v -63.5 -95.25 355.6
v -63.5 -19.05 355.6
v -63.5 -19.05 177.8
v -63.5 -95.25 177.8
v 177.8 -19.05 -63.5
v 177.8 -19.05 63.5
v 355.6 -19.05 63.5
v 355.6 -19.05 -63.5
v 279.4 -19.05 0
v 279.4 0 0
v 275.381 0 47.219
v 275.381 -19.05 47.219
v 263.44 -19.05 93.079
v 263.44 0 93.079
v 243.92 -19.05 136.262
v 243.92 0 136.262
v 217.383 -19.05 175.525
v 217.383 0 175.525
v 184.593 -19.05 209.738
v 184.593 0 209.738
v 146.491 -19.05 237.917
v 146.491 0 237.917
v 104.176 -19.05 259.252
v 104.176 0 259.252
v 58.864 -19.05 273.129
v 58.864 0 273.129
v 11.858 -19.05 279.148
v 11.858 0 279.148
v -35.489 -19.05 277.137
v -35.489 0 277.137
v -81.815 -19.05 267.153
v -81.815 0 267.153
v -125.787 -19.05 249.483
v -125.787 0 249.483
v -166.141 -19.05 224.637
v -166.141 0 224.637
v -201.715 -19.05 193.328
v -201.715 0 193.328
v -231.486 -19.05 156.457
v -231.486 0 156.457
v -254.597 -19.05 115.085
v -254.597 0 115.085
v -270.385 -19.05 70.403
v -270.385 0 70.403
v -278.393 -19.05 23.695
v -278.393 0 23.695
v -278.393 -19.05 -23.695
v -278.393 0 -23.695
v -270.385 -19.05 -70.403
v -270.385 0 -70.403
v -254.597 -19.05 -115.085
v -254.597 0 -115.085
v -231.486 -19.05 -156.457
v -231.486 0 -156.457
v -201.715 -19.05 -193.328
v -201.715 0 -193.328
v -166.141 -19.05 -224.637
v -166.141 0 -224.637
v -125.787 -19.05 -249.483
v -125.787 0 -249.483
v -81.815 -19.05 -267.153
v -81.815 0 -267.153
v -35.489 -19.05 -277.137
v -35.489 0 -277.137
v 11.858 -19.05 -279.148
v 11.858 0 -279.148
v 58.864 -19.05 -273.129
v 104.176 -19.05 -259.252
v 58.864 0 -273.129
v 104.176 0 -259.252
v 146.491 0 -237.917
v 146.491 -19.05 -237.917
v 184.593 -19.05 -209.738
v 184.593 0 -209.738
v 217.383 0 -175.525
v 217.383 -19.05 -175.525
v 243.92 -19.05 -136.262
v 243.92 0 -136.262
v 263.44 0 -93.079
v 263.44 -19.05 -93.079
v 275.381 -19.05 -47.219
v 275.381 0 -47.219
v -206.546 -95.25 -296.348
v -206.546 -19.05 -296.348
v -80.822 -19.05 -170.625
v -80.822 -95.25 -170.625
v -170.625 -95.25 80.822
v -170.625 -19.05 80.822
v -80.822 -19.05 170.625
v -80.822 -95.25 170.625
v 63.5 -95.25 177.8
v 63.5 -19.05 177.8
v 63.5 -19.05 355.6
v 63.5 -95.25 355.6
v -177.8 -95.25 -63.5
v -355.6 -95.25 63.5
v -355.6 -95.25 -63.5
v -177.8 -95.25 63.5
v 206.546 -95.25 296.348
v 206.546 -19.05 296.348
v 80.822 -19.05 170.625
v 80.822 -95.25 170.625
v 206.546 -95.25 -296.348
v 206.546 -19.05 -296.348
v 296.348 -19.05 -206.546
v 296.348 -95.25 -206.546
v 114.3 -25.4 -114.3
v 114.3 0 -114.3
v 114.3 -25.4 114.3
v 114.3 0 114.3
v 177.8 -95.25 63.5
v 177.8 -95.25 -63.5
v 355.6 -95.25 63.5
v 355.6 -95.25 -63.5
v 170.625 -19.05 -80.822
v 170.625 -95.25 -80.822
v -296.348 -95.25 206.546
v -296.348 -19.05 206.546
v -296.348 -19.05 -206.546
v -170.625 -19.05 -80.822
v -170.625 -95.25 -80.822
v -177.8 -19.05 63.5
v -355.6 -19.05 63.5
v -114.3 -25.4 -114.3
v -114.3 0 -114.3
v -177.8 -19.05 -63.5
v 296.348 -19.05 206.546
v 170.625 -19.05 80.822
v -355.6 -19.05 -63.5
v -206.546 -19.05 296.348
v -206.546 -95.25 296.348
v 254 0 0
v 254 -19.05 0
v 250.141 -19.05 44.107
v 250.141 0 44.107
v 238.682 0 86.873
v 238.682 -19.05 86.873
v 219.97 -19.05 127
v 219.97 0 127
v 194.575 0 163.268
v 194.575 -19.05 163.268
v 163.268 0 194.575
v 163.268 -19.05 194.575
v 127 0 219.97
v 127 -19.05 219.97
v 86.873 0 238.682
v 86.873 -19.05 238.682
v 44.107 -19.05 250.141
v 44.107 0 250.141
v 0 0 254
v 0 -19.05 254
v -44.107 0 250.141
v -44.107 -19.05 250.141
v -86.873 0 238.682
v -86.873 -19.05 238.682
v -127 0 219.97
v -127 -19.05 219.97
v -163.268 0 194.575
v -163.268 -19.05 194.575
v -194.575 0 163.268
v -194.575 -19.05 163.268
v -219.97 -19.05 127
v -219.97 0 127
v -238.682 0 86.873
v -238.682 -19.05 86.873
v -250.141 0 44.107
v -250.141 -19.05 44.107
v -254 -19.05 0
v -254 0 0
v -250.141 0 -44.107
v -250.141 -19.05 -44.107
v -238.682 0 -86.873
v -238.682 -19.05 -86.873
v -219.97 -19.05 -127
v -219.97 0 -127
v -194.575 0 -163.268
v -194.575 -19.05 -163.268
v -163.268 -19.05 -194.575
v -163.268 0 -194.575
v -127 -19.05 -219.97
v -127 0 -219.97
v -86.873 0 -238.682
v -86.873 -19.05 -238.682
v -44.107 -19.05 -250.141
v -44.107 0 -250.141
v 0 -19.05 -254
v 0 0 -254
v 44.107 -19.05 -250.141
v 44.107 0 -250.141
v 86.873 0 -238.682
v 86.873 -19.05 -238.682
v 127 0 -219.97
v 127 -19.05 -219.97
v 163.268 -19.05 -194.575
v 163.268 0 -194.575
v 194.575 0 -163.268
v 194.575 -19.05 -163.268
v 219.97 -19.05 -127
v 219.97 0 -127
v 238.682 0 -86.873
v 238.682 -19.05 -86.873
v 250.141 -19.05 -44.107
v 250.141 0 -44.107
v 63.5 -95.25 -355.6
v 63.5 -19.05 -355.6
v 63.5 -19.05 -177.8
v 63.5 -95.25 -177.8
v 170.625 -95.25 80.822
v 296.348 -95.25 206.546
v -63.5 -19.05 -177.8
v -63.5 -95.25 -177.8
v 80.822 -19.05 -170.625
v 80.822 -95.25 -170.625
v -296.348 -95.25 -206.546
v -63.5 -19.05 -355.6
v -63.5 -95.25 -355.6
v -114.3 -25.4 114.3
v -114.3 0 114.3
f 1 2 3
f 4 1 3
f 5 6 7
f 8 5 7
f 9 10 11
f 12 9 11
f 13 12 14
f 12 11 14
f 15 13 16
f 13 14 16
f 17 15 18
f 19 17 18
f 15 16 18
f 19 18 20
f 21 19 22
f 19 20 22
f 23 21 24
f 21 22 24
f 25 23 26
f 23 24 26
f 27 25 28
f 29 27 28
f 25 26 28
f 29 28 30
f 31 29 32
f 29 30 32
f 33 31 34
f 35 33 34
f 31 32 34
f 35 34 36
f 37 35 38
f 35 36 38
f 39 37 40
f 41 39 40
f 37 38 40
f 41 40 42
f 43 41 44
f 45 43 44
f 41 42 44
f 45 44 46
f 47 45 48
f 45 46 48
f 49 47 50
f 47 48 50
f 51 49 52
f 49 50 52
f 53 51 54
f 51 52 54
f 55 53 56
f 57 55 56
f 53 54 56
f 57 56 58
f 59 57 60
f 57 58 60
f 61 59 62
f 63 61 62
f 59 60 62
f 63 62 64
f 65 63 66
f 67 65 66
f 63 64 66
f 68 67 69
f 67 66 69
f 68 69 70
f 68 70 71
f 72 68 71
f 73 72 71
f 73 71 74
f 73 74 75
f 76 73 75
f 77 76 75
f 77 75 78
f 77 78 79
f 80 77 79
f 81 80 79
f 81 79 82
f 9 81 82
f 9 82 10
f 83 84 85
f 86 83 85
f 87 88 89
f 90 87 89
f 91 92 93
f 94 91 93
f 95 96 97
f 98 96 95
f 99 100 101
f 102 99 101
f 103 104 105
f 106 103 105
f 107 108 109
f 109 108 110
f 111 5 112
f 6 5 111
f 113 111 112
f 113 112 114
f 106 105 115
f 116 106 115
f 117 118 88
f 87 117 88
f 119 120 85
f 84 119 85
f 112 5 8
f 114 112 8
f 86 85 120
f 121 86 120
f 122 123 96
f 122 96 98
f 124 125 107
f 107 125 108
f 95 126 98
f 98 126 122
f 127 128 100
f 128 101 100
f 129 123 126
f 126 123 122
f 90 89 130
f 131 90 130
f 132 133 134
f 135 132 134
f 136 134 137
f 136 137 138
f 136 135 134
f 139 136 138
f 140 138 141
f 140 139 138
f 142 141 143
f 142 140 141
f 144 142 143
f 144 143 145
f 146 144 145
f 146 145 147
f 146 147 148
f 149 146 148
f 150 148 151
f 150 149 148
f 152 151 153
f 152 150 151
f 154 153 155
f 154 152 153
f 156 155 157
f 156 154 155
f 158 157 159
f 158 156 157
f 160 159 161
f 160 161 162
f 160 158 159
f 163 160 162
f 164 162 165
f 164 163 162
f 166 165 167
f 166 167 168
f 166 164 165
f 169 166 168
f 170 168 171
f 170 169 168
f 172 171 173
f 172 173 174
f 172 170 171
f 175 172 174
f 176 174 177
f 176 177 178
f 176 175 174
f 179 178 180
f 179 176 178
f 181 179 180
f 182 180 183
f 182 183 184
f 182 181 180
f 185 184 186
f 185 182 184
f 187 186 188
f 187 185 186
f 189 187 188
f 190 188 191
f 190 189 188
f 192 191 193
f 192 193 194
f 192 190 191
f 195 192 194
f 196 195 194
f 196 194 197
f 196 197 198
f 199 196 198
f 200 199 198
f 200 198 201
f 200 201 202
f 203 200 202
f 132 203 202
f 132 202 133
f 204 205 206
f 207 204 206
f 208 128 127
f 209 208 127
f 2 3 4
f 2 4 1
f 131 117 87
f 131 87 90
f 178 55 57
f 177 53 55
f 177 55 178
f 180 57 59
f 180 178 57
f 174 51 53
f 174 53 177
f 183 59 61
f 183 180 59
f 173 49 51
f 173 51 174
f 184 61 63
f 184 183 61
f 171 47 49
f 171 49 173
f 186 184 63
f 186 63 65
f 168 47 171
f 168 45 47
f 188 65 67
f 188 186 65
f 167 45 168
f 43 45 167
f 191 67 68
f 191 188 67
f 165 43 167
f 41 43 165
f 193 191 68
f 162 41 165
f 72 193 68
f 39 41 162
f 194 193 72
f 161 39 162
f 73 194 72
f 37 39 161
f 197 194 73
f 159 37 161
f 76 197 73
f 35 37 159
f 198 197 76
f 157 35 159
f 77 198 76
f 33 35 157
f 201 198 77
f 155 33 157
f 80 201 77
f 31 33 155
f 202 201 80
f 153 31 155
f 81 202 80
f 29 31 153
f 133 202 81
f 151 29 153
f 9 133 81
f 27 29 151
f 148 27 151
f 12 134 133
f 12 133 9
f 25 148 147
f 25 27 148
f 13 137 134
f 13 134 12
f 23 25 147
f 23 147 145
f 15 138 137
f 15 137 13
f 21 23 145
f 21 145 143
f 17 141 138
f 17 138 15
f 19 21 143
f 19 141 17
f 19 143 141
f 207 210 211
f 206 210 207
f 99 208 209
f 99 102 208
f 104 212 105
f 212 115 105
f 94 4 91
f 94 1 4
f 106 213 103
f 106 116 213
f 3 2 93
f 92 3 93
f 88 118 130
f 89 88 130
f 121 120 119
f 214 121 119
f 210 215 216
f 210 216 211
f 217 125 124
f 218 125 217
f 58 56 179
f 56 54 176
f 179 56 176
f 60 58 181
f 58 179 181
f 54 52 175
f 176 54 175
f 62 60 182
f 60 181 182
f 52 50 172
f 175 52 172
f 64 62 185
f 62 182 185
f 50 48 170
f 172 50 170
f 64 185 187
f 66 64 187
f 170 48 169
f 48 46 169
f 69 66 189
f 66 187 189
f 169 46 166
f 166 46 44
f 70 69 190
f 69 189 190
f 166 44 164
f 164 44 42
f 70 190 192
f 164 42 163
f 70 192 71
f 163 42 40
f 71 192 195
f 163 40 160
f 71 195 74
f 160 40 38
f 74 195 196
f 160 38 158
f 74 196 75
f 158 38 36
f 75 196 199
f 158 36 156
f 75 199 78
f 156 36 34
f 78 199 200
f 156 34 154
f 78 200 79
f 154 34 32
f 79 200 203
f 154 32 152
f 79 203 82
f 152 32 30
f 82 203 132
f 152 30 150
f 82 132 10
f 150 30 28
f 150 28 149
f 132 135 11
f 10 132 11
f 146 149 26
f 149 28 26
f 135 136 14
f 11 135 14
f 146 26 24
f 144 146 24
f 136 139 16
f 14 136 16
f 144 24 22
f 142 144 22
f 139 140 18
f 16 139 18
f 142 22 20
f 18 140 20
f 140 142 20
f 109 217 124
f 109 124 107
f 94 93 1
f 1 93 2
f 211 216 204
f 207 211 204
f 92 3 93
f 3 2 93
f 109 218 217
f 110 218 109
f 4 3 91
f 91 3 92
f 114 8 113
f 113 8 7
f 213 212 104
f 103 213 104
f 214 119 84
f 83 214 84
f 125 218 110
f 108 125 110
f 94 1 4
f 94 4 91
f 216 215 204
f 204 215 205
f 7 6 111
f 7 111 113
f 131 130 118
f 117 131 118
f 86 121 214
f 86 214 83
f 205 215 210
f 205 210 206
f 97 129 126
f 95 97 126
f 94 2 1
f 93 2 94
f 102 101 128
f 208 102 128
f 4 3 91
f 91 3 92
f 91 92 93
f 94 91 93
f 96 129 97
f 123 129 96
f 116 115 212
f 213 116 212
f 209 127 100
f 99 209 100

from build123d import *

# Parameters (mm, degrees)
F0_R     = 279.4
F0_R_2   = 254
F1_DEPTH = 19.05
F3_DEPTH = 76.2
F2_W     = 127
F2_H     = 177.8
F4_DEPTH = 76.2
F2_W_2   = 177.8
F2_H_2   = 127
F5_W     = 228.6
F5_H     = 228.6
F6_DEPTH = 25.4


with BuildPart() as f1:
    # F0 (on Front) → F1 (new body)
    with BuildSketch(Plane.XZ):
        Circle(F0_R)
        Circle(F0_R_2, mode=Mode.SUBTRACT)
    extrude(amount=F1_DEPTH)


with BuildPart() as f3:
    # F2 (on face) → F3 (new body)
    with BuildSketch(Plane.XZ.offset(19.05)):
        with BuildLine():
            ThreePointArc((63.5, 272.0884231275), (0, 279.4), (-63.5, 272.0884231275))
            Line((-63.5, 272.0884231275), (-63.5, 245.9344424842))
            ThreePointArc((-63.5, 245.9344424842), (0, 254), (63.5, 245.9344424842))
            Line((63.5, 245.9344424842), (63.5, 272.0884231275))
        make_face()
        with BuildLine():
            ThreePointArc((63.5, 245.9344424842), (0, 254), (-63.5, 245.9344424842))
            Line((-63.5, 245.9344424842), (-63.5, 177.8))
            Line((-63.5, 177.8), (63.5, 177.8))
            Line((63.5, 177.8), (63.5, 245.9344424842))
        make_face()
        with BuildLine():
            Line((63.5, 355.6), (-63.5, 355.6))
            Line((-63.5, 355.6), (-63.5, 272.0884231275))
            ThreePointArc((-63.5, 272.0884231275), (0, 279.4), (63.5, 272.0884231275))
            Line((63.5, 272.0884231275), (63.5, 355.6))
        make_face()
    extrude(amount=F3_DEPTH)


with BuildPart() as f4:
    # F2 (on face) → F4 (new body)
    with BuildSketch(Plane.XZ.offset(19.05)):
        with Locations((0, 266.7)):
            Rectangle(F2_W, F2_H)
    extrude(amount=F4_DEPTH)


with BuildPart() as f4b:
    # F2 (on face) → F4, piece 2 (new body)
    with BuildSketch(Plane.XZ.offset(19.05)):
        Polygon((-80.8223050896, 170.6248663003), (-206.5458907846, 296.3484519953), (-296.3484519953, 206.5458907846), (-170.6248663003, 80.8223050896), align=None)
    extrude(amount=F4_DEPTH)


with BuildPart() as f4c:
    # F2 (on face) → F4, piece 3 (new body)
    with BuildSketch(Plane.XZ.offset(19.05)):
        with Locations((-266.7, 0)):
            Rectangle(F2_W_2, F2_H_2)
    extrude(amount=F4_DEPTH)


with BuildPart() as f4d:
    # F2 (on face) → F4, piece 4 (new body)
    with BuildSketch(Plane.XZ.offset(19.05)):
        Polygon((-170.6248663003, -80.8223050896), (-296.3484519953, -206.5458907846), (-206.5458907846, -296.3484519953), (-80.8223050896, -170.6248663003), align=None)
    extrude(amount=F4_DEPTH)


with BuildPart() as f4e:
    # F2 (on face) → F4, piece 5 (new body)
    with BuildSketch(Plane.XZ.offset(19.05)):
        with Locations((0, -266.7)):
            Rectangle(F2_W, F2_H)
    extrude(amount=F4_DEPTH)


with BuildPart() as f4f:
    # F2 (on face) → F4, piece 6 (new body)
    with BuildSketch(Plane.XZ.offset(19.05)):
        Polygon((80.8223050896, -170.6248663003), (206.5458907846, -296.3484519953), (296.3484519953, -206.5458907846), (170.6248663003, -80.8223050896), align=None)
    extrude(amount=F4_DEPTH)


with BuildPart() as f4g:
    # F2 (on face) → F4, piece 7 (new body)
    with BuildSketch(Plane.XZ.offset(19.05)):
        with Locations((266.7, 0)):
            Rectangle(F2_W_2, F2_H_2)
    extrude(amount=F4_DEPTH)


with BuildPart() as f4h:
    # F2 (on face) → F4, piece 8 (new body)
    with BuildSketch(Plane.XZ.offset(19.05)):
        Polygon((170.6248663003, 80.8223050896), (296.3484519953, 206.5458907846), (206.5458907846, 296.3484519953), (80.8223050896, 170.6248663003), align=None)
    extrude(amount=F4_DEPTH)


with BuildPart() as f6:
    # F5 (on Front) → F6 (new body)
    with BuildSketch(Plane.XZ):
        Rectangle(F5_W, F5_H)
    extrude(amount=F6_DEPTH)


solid = Compound([f1.part, f3.part, f4.part, f4b.part, f4c.part, f4d.part, f4e.part, f4f.part, f4g.part, f4h.part, f6.part])
